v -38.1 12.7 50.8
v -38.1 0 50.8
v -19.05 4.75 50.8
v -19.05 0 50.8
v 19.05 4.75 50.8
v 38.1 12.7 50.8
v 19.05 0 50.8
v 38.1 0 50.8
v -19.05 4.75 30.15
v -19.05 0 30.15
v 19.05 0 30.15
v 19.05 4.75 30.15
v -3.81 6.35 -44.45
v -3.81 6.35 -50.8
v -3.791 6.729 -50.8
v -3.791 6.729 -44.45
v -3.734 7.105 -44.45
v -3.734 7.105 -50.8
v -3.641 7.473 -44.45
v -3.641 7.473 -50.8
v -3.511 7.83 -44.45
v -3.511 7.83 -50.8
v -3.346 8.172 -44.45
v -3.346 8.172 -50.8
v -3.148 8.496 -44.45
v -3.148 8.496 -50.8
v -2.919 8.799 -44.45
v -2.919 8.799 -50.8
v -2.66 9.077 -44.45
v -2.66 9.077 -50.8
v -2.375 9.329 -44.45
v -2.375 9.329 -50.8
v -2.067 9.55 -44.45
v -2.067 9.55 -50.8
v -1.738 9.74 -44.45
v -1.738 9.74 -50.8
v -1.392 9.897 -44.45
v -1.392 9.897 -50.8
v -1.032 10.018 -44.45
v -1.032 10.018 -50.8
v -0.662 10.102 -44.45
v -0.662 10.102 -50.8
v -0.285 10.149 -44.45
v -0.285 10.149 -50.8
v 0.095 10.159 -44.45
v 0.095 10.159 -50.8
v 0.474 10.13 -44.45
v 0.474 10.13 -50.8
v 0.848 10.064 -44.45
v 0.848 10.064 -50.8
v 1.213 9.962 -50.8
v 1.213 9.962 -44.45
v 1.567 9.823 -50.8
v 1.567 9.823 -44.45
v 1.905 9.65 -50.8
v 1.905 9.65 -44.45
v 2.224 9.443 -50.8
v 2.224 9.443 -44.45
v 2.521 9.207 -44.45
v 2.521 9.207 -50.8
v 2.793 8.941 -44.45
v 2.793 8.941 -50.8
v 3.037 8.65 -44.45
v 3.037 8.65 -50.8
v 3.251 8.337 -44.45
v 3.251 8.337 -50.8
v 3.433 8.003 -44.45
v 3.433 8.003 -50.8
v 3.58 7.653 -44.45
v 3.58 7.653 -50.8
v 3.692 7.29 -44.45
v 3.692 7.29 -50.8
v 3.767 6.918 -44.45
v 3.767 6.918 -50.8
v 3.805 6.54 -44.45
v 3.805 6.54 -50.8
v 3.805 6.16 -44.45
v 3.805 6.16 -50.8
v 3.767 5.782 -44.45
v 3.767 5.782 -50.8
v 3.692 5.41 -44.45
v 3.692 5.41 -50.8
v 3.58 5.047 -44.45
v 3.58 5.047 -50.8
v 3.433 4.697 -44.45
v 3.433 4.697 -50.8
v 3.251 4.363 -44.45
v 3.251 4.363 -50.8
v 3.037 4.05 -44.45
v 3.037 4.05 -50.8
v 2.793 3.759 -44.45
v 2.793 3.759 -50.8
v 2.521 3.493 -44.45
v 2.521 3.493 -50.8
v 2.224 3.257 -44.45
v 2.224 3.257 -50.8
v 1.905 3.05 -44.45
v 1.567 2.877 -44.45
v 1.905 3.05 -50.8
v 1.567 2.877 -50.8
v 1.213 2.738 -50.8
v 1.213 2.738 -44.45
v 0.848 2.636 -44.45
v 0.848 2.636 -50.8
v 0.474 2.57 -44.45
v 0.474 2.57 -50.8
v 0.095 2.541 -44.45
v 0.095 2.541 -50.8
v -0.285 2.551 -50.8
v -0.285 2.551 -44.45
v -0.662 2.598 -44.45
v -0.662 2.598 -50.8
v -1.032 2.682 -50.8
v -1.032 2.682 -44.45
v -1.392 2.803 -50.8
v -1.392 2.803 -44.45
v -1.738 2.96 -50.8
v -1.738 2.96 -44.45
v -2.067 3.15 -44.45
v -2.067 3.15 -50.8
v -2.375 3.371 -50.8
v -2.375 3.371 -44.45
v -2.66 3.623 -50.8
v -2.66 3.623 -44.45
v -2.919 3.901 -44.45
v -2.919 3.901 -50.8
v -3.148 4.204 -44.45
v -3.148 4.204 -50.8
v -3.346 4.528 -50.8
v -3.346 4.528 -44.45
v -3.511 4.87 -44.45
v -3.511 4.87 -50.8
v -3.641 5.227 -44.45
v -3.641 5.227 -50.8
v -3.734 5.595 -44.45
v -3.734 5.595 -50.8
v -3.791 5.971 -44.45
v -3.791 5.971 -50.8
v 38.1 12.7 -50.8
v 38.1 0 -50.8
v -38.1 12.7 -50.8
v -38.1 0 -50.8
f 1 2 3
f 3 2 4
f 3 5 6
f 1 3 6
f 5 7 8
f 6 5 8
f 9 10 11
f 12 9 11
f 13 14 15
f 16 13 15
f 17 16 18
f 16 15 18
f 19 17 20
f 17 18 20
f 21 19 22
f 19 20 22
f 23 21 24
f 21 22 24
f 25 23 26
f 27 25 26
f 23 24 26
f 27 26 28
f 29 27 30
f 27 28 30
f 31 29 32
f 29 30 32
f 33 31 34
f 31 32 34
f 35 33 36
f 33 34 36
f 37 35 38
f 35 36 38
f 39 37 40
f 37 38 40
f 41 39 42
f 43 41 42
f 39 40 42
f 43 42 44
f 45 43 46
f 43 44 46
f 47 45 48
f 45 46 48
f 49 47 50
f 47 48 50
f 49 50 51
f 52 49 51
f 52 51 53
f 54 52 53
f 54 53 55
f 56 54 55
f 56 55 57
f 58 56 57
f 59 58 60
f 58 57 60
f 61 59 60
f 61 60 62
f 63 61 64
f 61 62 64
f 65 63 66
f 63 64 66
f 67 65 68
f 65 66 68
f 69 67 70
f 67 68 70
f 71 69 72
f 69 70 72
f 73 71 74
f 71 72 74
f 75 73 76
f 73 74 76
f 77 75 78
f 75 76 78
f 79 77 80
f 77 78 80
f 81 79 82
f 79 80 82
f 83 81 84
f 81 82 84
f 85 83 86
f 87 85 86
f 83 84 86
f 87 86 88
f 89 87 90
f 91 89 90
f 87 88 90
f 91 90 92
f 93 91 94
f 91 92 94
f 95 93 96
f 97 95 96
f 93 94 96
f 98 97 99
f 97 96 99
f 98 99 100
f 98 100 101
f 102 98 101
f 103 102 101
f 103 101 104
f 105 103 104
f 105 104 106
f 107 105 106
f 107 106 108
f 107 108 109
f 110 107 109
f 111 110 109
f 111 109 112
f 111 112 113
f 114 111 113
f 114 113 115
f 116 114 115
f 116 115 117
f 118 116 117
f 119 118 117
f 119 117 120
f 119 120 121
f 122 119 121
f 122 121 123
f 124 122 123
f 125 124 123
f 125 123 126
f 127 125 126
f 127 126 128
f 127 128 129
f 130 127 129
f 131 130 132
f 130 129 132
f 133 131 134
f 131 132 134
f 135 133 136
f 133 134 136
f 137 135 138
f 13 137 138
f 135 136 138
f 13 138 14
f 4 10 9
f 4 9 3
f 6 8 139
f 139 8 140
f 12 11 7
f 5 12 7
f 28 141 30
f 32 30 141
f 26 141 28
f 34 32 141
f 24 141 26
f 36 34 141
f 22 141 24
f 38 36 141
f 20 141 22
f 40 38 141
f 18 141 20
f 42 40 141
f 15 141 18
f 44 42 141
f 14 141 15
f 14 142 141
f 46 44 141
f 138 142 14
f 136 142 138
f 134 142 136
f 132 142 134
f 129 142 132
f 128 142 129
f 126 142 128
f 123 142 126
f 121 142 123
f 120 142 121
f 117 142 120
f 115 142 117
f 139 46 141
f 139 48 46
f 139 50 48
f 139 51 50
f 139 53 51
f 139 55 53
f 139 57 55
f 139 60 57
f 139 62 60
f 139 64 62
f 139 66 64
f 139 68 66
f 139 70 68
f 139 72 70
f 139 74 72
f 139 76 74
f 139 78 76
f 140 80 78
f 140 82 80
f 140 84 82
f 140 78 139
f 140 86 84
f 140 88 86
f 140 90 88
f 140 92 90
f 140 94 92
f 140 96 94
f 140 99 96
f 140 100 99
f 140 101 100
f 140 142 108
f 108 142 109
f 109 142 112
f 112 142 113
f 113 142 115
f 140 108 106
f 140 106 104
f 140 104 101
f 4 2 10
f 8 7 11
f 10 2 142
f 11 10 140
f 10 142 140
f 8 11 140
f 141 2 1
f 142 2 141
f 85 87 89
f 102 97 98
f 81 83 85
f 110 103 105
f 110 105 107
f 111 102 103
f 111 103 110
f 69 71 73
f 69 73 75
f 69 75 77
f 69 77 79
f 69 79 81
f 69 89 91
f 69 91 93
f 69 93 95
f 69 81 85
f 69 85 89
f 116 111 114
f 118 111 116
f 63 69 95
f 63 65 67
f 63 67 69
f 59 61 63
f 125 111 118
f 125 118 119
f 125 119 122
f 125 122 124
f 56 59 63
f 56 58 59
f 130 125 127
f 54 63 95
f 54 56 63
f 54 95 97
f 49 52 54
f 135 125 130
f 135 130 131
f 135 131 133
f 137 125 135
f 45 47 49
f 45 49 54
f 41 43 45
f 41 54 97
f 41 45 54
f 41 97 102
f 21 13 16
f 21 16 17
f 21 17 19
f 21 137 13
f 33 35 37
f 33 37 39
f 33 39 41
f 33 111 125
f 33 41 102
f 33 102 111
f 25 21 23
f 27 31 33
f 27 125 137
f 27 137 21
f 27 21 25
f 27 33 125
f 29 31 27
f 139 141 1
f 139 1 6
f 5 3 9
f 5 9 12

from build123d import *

# Parameters (mm, degrees)
SKETCH1_W           = 76.2
SKETCH1_H           = 101.6
BOSS_EXTRUDE1_DEPTH = 12.7
SKETCH2_W           = 38.1
SKETCH2_H           = 20.6502
CUT_EXTRUDE1_DEPTH  = 4.7498
SKETCH3_R           = 3.81
CUT_EXTRUDE2_DEPTH  = 6.35


with BuildPart() as part:
    # Sketch1 → Boss-Extrude1 (new body)
    with BuildSketch(Plane(origin=(0, 0, 0), x_dir=(1, 0, 0), z_dir=(0, 1, 0))):
        Rectangle(SKETCH1_W, SKETCH1_H)
    extrude(amount=BOSS_EXTRUDE1_DEPTH)

    # Sketch2 → Cut-Extrude1 (cut)
    with BuildSketch(Plane.XZ):
        with Locations((0, 40.4749)):
            Rectangle(SKETCH2_W, SKETCH2_H)
    extrude(amount=-CUT_EXTRUDE1_DEPTH, mode=Mode.SUBTRACT)

    # Sketch3 → Cut-Extrude2 (cut)
    with BuildSketch(Plane(origin=(0, 0, -50.8), x_dir=(-1, 0, 0), z_dir=(0, 0, -1))):
        with Locations((0, 6.35)):
            Circle(SKETCH3_R)
    extrude(amount=-CUT_EXTRUDE2_DEPTH, mode=Mode.SUBTRACT)


solid = part.part
